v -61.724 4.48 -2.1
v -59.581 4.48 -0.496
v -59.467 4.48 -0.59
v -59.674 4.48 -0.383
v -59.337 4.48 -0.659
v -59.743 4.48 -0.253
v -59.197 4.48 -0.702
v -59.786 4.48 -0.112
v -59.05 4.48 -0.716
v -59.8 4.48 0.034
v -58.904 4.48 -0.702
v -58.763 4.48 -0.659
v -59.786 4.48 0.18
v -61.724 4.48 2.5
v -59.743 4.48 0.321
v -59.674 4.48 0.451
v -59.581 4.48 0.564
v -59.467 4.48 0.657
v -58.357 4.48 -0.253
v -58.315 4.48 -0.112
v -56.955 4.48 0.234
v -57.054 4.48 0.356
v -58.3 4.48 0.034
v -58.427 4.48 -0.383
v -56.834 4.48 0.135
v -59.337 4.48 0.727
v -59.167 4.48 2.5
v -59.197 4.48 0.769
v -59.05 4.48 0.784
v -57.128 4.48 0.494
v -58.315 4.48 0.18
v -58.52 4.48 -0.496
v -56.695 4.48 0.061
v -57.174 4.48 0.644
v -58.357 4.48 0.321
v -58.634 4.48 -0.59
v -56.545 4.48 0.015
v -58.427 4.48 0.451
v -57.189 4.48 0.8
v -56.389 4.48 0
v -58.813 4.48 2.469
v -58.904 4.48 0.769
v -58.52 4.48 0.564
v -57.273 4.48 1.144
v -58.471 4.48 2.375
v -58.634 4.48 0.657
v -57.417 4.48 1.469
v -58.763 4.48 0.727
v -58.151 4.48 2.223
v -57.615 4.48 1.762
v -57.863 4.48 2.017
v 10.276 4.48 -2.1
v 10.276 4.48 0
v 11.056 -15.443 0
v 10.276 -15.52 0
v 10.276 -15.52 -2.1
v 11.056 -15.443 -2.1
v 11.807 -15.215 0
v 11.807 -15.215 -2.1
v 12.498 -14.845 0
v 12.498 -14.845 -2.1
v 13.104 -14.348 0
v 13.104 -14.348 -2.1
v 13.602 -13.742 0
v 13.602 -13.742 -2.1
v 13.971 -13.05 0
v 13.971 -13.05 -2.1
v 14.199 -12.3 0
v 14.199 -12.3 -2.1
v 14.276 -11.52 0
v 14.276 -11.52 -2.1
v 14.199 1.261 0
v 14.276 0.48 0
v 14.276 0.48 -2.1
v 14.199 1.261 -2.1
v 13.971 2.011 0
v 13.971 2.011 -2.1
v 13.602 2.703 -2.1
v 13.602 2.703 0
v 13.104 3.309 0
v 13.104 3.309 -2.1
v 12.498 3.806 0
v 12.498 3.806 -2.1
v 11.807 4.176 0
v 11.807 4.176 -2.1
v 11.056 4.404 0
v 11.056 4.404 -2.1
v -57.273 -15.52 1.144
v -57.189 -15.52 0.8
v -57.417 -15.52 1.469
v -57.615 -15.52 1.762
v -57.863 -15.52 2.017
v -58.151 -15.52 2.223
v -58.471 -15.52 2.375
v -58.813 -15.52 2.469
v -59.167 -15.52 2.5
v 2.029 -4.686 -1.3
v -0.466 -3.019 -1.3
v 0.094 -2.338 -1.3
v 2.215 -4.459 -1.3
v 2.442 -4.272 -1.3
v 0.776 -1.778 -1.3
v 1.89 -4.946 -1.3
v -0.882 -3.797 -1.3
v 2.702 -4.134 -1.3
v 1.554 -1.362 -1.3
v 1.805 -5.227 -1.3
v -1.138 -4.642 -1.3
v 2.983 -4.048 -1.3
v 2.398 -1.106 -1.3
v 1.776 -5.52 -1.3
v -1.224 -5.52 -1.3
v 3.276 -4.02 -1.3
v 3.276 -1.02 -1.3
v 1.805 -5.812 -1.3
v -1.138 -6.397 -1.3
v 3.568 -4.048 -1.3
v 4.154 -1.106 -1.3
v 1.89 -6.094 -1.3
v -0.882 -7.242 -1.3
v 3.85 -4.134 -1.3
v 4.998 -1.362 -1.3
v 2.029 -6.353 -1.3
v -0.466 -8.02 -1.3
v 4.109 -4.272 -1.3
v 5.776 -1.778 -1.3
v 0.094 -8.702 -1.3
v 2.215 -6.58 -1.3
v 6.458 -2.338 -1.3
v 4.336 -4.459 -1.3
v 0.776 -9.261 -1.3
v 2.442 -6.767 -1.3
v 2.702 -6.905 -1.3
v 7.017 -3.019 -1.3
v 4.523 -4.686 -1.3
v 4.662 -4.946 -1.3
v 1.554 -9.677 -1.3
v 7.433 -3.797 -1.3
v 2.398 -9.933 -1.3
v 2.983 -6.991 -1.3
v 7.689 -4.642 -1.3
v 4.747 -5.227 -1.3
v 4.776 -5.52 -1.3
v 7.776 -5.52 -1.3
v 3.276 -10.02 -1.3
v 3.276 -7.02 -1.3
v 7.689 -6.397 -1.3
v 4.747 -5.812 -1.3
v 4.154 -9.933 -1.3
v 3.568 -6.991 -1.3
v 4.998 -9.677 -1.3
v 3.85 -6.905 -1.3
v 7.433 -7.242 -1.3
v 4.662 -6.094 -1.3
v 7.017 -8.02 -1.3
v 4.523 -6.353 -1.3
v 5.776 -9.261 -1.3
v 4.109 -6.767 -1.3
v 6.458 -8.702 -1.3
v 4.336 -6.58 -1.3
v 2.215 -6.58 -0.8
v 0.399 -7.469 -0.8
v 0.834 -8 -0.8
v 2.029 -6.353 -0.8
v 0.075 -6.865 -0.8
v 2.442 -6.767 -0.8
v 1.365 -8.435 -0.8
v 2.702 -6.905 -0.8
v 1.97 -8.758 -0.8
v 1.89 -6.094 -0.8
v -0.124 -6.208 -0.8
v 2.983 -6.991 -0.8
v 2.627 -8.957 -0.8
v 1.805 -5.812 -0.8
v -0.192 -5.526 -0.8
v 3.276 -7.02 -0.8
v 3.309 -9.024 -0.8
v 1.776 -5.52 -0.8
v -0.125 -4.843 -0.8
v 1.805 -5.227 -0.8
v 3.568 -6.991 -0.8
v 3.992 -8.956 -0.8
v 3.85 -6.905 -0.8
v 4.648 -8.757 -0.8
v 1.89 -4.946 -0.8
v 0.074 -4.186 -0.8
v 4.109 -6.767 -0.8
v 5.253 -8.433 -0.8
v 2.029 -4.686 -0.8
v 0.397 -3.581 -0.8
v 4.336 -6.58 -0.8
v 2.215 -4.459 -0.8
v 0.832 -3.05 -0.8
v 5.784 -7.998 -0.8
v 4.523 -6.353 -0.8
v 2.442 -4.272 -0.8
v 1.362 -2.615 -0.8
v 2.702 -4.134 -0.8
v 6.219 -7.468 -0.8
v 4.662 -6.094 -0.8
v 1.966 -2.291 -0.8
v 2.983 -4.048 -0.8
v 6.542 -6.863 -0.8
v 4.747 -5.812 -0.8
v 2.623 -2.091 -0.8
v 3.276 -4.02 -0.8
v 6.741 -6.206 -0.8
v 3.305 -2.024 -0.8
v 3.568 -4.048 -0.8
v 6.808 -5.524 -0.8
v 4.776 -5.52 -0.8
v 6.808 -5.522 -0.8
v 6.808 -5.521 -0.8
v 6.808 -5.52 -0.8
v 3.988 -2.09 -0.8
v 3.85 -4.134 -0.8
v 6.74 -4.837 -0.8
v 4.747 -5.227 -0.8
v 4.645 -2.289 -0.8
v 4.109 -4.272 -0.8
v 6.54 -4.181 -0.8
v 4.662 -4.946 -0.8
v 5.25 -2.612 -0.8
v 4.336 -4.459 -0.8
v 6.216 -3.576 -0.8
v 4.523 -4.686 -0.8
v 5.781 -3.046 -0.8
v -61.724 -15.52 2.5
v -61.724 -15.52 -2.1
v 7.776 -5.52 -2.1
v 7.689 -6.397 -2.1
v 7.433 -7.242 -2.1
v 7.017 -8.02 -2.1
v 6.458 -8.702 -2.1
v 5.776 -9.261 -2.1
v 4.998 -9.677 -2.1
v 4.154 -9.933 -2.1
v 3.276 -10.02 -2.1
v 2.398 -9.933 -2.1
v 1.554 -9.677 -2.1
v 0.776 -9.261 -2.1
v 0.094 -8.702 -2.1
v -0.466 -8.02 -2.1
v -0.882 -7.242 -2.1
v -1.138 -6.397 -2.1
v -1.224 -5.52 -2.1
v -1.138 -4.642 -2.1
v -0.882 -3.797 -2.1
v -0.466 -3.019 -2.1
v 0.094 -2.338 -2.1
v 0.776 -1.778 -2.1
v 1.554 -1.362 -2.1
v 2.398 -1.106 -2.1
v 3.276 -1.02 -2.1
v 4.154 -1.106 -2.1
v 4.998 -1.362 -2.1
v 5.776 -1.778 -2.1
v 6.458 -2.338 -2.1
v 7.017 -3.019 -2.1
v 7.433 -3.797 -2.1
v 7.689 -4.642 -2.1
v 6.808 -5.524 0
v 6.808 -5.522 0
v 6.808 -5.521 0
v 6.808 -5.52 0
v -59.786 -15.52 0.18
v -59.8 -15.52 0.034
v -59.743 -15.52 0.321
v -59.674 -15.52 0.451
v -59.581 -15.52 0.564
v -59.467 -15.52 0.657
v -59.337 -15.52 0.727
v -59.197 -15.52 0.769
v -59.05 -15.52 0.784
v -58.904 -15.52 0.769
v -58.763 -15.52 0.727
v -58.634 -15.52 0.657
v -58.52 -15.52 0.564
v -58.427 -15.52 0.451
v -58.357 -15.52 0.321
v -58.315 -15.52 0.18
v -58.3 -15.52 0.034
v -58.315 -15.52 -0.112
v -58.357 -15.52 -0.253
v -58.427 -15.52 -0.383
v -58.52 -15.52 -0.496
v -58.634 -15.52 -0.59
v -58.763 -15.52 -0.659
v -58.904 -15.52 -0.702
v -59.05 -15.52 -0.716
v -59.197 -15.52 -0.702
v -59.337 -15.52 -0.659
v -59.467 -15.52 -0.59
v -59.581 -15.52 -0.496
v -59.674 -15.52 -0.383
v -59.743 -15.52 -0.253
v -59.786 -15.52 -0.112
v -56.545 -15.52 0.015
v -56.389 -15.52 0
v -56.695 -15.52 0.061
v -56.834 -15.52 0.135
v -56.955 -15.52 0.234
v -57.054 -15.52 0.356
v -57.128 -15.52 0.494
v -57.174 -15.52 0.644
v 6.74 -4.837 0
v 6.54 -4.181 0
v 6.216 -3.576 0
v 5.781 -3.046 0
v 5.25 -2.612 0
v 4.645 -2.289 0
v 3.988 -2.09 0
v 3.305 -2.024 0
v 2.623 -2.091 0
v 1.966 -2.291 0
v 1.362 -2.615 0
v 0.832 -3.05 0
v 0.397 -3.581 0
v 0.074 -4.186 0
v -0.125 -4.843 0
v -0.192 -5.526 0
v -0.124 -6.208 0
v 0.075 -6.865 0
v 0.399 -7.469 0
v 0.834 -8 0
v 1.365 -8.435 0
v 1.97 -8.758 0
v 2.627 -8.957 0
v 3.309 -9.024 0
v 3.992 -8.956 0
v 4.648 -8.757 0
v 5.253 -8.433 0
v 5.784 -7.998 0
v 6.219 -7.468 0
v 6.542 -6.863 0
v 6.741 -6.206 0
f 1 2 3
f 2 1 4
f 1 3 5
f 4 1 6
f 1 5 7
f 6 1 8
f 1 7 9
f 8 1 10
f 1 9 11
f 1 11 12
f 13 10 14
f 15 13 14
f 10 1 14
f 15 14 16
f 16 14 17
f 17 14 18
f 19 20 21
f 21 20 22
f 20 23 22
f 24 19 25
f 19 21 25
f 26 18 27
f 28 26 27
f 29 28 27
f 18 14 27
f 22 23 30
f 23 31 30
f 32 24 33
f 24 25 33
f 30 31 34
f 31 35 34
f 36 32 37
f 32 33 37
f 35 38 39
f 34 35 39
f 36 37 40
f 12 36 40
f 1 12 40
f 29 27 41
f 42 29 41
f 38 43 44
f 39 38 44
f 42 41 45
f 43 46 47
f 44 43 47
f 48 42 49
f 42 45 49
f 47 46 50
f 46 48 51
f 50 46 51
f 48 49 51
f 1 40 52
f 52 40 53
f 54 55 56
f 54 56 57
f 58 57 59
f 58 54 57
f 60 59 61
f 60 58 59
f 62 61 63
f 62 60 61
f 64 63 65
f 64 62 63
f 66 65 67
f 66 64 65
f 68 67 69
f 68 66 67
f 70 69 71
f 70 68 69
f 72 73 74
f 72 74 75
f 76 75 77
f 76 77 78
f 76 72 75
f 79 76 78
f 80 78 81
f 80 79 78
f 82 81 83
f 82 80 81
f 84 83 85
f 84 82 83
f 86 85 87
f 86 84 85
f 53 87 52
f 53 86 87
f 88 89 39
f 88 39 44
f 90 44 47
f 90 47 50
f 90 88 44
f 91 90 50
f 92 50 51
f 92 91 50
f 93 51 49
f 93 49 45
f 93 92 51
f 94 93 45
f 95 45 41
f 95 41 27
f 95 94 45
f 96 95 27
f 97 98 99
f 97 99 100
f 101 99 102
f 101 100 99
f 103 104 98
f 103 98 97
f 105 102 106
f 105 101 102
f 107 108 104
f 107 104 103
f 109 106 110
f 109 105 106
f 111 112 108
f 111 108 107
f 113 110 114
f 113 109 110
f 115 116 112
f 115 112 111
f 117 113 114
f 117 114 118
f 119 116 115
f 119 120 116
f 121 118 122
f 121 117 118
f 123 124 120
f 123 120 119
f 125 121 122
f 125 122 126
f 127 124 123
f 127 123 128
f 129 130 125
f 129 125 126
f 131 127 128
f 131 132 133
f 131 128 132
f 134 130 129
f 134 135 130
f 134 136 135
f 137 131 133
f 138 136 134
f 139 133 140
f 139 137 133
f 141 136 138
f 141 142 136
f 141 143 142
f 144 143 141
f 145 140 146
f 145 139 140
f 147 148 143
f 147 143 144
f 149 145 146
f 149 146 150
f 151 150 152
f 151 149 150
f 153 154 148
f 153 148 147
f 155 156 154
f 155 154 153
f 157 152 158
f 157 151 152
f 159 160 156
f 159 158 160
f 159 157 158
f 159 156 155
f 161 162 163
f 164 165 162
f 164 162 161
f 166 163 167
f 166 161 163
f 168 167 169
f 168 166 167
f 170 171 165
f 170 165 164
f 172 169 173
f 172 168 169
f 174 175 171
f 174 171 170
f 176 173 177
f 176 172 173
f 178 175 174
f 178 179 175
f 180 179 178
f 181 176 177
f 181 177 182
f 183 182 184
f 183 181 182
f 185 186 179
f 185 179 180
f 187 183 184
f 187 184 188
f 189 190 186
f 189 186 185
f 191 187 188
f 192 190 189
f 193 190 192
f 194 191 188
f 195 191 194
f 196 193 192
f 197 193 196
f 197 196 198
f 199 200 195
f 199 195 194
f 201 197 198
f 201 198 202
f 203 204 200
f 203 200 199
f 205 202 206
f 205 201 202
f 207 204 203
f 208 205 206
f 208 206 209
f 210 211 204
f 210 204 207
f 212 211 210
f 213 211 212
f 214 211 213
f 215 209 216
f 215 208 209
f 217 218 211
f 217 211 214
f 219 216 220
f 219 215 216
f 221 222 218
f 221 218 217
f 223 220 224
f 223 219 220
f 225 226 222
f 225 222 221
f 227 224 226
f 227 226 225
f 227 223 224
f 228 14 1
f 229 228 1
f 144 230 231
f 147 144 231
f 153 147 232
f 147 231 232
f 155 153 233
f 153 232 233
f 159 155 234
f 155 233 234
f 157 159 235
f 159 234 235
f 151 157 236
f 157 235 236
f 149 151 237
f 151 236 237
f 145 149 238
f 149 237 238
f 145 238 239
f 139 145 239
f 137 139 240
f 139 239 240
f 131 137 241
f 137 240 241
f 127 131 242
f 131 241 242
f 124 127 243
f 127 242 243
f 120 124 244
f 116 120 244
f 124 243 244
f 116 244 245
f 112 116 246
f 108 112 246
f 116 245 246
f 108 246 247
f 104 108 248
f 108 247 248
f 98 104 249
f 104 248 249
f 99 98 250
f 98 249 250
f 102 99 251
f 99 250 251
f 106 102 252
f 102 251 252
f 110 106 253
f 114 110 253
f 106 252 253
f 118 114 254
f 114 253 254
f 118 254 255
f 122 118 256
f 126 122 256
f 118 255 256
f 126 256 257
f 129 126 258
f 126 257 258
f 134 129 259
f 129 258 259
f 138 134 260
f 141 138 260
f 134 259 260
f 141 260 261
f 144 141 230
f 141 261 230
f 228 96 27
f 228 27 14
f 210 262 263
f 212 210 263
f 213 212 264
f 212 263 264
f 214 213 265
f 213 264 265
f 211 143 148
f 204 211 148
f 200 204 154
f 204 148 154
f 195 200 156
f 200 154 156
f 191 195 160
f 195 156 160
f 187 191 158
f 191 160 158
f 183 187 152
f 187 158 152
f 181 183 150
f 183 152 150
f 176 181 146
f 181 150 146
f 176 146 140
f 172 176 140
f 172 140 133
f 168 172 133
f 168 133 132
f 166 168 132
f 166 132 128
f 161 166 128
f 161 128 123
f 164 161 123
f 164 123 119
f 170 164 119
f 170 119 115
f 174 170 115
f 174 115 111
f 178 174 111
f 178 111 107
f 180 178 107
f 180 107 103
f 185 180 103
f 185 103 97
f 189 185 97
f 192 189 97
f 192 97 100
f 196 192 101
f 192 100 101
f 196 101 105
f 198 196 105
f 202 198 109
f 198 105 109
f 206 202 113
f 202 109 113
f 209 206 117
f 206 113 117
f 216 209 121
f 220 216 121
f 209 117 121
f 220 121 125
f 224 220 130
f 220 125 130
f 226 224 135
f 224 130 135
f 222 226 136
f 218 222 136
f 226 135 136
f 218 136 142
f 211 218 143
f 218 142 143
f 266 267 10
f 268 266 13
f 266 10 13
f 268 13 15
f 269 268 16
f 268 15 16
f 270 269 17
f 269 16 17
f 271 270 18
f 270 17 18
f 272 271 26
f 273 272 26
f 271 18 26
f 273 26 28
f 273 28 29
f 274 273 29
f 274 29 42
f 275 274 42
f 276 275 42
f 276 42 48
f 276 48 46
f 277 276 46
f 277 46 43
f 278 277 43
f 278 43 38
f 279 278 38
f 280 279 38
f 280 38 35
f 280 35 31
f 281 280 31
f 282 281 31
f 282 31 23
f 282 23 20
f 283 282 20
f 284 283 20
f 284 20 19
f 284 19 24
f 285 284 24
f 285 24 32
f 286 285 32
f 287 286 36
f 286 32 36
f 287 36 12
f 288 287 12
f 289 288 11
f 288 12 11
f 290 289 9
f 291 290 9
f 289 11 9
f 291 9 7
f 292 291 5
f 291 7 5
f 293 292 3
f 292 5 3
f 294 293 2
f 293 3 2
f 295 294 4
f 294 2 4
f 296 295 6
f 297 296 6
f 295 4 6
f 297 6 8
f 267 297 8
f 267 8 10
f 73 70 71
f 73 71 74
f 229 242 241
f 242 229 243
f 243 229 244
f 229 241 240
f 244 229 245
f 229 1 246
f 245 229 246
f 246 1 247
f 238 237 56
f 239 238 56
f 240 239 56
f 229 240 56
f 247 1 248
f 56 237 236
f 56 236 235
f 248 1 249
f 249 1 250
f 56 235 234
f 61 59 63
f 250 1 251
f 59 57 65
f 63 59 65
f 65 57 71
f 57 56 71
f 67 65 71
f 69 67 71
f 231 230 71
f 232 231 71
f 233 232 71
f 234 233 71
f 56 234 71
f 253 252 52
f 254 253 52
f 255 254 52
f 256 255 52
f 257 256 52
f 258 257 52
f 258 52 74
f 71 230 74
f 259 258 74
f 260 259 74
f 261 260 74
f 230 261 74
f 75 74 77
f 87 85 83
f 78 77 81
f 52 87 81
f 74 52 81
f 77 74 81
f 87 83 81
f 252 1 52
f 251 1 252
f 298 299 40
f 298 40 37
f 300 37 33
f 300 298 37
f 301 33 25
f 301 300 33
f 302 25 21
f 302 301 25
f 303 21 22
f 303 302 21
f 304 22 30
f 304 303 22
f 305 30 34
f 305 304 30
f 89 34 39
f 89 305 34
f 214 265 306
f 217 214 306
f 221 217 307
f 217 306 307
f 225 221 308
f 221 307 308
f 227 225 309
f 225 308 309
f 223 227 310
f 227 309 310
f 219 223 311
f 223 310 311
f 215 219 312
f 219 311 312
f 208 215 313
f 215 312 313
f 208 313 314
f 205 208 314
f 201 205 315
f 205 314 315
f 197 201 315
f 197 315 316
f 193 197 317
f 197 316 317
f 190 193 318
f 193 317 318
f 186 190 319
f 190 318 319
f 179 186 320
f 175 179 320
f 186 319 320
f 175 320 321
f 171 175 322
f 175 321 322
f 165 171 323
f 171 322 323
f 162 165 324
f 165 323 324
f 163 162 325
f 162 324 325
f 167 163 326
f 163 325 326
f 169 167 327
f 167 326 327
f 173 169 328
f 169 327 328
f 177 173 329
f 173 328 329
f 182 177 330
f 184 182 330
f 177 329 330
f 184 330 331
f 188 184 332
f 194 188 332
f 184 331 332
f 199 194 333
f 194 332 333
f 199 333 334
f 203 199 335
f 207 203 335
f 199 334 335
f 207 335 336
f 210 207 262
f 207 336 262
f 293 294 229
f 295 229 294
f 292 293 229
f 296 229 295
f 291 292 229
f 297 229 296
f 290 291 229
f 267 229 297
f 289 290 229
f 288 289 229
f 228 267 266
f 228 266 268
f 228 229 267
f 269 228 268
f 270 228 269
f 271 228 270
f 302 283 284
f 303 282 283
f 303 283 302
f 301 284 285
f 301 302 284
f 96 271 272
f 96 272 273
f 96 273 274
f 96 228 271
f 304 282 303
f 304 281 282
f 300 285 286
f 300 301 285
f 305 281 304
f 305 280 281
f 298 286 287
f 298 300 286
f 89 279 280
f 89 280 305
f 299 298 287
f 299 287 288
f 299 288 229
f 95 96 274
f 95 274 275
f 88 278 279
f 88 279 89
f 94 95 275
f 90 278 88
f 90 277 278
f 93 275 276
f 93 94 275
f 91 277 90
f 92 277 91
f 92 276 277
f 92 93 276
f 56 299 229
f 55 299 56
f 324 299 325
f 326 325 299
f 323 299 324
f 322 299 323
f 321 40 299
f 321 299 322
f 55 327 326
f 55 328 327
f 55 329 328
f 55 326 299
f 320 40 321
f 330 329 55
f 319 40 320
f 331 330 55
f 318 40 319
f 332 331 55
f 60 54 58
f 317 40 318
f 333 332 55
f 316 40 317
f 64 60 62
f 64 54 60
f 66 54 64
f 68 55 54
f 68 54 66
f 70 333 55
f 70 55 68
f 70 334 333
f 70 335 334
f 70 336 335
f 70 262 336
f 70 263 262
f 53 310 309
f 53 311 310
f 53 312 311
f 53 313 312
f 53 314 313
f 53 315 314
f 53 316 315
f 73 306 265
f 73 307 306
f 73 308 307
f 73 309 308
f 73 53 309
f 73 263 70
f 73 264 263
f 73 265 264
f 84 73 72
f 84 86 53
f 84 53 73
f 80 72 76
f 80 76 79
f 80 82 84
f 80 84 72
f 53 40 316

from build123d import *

# Parameters (mm, degrees)
F1_DEPTH  = 2.1
F2_R      = 1.5
F3_DEPTH  = 2.101
F5_DEPTH  = 0.8
F6_R      = 4.5
F6_R_2    = 1.5
F7_DEPTH  = 0.8
F9_DEPTH  = 20
F10_R     = 0.75
F11_DEPTH = 20.001


# Not quite as in the source:
# - a feature names something its author has since deleted; it is built from what else it names


with BuildPart() as f1:
    # F0 (on Top) → F1 (new body)
    with BuildSketch(Plane.XY):
        with BuildLine():
            Line((-61.724215433, 4.4804378226), (-61.724215433, -15.5195621774))
            Line((-61.724215433, -15.5195621774), (10.275784567, -15.5195621774))
            ThreePointArc((10.275784567, -15.5195621774), (13.1042116917, -14.3479893021), (14.275784567, -11.5195621774))
            Line((14.275784567, -11.5195621774), (14.275784567, -5.5195621774))
            Line((14.275784567, -5.5195621774), (14.275784567, 0.4804378226))
            ThreePointArc((14.275784567, 0.4804378226), (13.1042116917, 3.3088649474), (10.275784567, 4.4804378226))
            Line((10.275784567, 4.4804378226), (-61.724215433, 4.4804378226))
        make_face()
    extrude(amount=-F1_DEPTH)

    # F2 (on face) → F3 (cut, through all)
    with BuildSketch(Plane(origin=(0, 0, -2.1), x_dir=(1, 0, 0), z_dir=(0, 0, -1))):
        with Locations((3.2757834997, 5.5195621774)):
            Circle(F2_R)
    extrude(amount=-F3_DEPTH, mode=Mode.SUBTRACT)

    # F4 (on face) → F5 (cut)
    with BuildSketch(Plane.XY):
        with BuildLine():
            ThreePointArc((6.808292926, -5.5195621774), (-0.1917041784, -5.5256023727), (6.8082952425, -5.523588974))
            ThreePointArc((6.8082952425, -5.523588974), (6.8082946634, -5.5215755754), (6.808292926, -5.5195621774))
        make_face()
    extrude(amount=-F5_DEPTH, mode=Mode.SUBTRACT)

    # F6 (on face) → F7 (cut)
    with BuildSketch(Plane(origin=(0, 0, -2.1), x_dir=(1, 0, 0), z_dir=(0, 0, -1))):
        with Locations((3.2757834997, 5.5195621774)):
            Circle(F6_R)
        with Locations((3.2757834997, 5.5195621774)):
            Circle(F6_R_2, mode=Mode.SUBTRACT)
    extrude(amount=-F7_DEPTH, mode=Mode.SUBTRACT)

    # F8 (on face) → F9 (join)
    with BuildSketch(Plane.XZ.offset(15.5195621774)):
        with BuildLine():
            Line((-59.1665172217, 2.5), (-61.724215433, 2.5))
            Line((-61.724215433, 2.5), (-61.724215433, 0))
            Line((-61.724215433, 0), (-57.1891452284, 0))
            Line((-57.1891452284, 0), (-56.3891452284, 0))
            ThreePointArc((-56.3891452284, 0), (-56.9548306533, 0.2343145751), (-57.1891452284, 0.8))
            ThreePointArc((-57.1891452284, 0.8), (-57.8626767407, 2.0165750888), (-59.1665172217, 2.5))
        make_face()
    extrude(amount=-F9_DEPTH)

    # F10 (on face) → F11 (cut, through all)
    with BuildSketch(Plane(origin=(0, 4.4804378226, 0), x_dir=(-1, 0, 0), z_dir=(0, 1, 0))):
        with Locations((59.05039973, 0.0338958319)):
            Circle(F10_R)
    extrude(amount=-F11_DEPTH, mode=Mode.SUBTRACT)


solid = f1.part
